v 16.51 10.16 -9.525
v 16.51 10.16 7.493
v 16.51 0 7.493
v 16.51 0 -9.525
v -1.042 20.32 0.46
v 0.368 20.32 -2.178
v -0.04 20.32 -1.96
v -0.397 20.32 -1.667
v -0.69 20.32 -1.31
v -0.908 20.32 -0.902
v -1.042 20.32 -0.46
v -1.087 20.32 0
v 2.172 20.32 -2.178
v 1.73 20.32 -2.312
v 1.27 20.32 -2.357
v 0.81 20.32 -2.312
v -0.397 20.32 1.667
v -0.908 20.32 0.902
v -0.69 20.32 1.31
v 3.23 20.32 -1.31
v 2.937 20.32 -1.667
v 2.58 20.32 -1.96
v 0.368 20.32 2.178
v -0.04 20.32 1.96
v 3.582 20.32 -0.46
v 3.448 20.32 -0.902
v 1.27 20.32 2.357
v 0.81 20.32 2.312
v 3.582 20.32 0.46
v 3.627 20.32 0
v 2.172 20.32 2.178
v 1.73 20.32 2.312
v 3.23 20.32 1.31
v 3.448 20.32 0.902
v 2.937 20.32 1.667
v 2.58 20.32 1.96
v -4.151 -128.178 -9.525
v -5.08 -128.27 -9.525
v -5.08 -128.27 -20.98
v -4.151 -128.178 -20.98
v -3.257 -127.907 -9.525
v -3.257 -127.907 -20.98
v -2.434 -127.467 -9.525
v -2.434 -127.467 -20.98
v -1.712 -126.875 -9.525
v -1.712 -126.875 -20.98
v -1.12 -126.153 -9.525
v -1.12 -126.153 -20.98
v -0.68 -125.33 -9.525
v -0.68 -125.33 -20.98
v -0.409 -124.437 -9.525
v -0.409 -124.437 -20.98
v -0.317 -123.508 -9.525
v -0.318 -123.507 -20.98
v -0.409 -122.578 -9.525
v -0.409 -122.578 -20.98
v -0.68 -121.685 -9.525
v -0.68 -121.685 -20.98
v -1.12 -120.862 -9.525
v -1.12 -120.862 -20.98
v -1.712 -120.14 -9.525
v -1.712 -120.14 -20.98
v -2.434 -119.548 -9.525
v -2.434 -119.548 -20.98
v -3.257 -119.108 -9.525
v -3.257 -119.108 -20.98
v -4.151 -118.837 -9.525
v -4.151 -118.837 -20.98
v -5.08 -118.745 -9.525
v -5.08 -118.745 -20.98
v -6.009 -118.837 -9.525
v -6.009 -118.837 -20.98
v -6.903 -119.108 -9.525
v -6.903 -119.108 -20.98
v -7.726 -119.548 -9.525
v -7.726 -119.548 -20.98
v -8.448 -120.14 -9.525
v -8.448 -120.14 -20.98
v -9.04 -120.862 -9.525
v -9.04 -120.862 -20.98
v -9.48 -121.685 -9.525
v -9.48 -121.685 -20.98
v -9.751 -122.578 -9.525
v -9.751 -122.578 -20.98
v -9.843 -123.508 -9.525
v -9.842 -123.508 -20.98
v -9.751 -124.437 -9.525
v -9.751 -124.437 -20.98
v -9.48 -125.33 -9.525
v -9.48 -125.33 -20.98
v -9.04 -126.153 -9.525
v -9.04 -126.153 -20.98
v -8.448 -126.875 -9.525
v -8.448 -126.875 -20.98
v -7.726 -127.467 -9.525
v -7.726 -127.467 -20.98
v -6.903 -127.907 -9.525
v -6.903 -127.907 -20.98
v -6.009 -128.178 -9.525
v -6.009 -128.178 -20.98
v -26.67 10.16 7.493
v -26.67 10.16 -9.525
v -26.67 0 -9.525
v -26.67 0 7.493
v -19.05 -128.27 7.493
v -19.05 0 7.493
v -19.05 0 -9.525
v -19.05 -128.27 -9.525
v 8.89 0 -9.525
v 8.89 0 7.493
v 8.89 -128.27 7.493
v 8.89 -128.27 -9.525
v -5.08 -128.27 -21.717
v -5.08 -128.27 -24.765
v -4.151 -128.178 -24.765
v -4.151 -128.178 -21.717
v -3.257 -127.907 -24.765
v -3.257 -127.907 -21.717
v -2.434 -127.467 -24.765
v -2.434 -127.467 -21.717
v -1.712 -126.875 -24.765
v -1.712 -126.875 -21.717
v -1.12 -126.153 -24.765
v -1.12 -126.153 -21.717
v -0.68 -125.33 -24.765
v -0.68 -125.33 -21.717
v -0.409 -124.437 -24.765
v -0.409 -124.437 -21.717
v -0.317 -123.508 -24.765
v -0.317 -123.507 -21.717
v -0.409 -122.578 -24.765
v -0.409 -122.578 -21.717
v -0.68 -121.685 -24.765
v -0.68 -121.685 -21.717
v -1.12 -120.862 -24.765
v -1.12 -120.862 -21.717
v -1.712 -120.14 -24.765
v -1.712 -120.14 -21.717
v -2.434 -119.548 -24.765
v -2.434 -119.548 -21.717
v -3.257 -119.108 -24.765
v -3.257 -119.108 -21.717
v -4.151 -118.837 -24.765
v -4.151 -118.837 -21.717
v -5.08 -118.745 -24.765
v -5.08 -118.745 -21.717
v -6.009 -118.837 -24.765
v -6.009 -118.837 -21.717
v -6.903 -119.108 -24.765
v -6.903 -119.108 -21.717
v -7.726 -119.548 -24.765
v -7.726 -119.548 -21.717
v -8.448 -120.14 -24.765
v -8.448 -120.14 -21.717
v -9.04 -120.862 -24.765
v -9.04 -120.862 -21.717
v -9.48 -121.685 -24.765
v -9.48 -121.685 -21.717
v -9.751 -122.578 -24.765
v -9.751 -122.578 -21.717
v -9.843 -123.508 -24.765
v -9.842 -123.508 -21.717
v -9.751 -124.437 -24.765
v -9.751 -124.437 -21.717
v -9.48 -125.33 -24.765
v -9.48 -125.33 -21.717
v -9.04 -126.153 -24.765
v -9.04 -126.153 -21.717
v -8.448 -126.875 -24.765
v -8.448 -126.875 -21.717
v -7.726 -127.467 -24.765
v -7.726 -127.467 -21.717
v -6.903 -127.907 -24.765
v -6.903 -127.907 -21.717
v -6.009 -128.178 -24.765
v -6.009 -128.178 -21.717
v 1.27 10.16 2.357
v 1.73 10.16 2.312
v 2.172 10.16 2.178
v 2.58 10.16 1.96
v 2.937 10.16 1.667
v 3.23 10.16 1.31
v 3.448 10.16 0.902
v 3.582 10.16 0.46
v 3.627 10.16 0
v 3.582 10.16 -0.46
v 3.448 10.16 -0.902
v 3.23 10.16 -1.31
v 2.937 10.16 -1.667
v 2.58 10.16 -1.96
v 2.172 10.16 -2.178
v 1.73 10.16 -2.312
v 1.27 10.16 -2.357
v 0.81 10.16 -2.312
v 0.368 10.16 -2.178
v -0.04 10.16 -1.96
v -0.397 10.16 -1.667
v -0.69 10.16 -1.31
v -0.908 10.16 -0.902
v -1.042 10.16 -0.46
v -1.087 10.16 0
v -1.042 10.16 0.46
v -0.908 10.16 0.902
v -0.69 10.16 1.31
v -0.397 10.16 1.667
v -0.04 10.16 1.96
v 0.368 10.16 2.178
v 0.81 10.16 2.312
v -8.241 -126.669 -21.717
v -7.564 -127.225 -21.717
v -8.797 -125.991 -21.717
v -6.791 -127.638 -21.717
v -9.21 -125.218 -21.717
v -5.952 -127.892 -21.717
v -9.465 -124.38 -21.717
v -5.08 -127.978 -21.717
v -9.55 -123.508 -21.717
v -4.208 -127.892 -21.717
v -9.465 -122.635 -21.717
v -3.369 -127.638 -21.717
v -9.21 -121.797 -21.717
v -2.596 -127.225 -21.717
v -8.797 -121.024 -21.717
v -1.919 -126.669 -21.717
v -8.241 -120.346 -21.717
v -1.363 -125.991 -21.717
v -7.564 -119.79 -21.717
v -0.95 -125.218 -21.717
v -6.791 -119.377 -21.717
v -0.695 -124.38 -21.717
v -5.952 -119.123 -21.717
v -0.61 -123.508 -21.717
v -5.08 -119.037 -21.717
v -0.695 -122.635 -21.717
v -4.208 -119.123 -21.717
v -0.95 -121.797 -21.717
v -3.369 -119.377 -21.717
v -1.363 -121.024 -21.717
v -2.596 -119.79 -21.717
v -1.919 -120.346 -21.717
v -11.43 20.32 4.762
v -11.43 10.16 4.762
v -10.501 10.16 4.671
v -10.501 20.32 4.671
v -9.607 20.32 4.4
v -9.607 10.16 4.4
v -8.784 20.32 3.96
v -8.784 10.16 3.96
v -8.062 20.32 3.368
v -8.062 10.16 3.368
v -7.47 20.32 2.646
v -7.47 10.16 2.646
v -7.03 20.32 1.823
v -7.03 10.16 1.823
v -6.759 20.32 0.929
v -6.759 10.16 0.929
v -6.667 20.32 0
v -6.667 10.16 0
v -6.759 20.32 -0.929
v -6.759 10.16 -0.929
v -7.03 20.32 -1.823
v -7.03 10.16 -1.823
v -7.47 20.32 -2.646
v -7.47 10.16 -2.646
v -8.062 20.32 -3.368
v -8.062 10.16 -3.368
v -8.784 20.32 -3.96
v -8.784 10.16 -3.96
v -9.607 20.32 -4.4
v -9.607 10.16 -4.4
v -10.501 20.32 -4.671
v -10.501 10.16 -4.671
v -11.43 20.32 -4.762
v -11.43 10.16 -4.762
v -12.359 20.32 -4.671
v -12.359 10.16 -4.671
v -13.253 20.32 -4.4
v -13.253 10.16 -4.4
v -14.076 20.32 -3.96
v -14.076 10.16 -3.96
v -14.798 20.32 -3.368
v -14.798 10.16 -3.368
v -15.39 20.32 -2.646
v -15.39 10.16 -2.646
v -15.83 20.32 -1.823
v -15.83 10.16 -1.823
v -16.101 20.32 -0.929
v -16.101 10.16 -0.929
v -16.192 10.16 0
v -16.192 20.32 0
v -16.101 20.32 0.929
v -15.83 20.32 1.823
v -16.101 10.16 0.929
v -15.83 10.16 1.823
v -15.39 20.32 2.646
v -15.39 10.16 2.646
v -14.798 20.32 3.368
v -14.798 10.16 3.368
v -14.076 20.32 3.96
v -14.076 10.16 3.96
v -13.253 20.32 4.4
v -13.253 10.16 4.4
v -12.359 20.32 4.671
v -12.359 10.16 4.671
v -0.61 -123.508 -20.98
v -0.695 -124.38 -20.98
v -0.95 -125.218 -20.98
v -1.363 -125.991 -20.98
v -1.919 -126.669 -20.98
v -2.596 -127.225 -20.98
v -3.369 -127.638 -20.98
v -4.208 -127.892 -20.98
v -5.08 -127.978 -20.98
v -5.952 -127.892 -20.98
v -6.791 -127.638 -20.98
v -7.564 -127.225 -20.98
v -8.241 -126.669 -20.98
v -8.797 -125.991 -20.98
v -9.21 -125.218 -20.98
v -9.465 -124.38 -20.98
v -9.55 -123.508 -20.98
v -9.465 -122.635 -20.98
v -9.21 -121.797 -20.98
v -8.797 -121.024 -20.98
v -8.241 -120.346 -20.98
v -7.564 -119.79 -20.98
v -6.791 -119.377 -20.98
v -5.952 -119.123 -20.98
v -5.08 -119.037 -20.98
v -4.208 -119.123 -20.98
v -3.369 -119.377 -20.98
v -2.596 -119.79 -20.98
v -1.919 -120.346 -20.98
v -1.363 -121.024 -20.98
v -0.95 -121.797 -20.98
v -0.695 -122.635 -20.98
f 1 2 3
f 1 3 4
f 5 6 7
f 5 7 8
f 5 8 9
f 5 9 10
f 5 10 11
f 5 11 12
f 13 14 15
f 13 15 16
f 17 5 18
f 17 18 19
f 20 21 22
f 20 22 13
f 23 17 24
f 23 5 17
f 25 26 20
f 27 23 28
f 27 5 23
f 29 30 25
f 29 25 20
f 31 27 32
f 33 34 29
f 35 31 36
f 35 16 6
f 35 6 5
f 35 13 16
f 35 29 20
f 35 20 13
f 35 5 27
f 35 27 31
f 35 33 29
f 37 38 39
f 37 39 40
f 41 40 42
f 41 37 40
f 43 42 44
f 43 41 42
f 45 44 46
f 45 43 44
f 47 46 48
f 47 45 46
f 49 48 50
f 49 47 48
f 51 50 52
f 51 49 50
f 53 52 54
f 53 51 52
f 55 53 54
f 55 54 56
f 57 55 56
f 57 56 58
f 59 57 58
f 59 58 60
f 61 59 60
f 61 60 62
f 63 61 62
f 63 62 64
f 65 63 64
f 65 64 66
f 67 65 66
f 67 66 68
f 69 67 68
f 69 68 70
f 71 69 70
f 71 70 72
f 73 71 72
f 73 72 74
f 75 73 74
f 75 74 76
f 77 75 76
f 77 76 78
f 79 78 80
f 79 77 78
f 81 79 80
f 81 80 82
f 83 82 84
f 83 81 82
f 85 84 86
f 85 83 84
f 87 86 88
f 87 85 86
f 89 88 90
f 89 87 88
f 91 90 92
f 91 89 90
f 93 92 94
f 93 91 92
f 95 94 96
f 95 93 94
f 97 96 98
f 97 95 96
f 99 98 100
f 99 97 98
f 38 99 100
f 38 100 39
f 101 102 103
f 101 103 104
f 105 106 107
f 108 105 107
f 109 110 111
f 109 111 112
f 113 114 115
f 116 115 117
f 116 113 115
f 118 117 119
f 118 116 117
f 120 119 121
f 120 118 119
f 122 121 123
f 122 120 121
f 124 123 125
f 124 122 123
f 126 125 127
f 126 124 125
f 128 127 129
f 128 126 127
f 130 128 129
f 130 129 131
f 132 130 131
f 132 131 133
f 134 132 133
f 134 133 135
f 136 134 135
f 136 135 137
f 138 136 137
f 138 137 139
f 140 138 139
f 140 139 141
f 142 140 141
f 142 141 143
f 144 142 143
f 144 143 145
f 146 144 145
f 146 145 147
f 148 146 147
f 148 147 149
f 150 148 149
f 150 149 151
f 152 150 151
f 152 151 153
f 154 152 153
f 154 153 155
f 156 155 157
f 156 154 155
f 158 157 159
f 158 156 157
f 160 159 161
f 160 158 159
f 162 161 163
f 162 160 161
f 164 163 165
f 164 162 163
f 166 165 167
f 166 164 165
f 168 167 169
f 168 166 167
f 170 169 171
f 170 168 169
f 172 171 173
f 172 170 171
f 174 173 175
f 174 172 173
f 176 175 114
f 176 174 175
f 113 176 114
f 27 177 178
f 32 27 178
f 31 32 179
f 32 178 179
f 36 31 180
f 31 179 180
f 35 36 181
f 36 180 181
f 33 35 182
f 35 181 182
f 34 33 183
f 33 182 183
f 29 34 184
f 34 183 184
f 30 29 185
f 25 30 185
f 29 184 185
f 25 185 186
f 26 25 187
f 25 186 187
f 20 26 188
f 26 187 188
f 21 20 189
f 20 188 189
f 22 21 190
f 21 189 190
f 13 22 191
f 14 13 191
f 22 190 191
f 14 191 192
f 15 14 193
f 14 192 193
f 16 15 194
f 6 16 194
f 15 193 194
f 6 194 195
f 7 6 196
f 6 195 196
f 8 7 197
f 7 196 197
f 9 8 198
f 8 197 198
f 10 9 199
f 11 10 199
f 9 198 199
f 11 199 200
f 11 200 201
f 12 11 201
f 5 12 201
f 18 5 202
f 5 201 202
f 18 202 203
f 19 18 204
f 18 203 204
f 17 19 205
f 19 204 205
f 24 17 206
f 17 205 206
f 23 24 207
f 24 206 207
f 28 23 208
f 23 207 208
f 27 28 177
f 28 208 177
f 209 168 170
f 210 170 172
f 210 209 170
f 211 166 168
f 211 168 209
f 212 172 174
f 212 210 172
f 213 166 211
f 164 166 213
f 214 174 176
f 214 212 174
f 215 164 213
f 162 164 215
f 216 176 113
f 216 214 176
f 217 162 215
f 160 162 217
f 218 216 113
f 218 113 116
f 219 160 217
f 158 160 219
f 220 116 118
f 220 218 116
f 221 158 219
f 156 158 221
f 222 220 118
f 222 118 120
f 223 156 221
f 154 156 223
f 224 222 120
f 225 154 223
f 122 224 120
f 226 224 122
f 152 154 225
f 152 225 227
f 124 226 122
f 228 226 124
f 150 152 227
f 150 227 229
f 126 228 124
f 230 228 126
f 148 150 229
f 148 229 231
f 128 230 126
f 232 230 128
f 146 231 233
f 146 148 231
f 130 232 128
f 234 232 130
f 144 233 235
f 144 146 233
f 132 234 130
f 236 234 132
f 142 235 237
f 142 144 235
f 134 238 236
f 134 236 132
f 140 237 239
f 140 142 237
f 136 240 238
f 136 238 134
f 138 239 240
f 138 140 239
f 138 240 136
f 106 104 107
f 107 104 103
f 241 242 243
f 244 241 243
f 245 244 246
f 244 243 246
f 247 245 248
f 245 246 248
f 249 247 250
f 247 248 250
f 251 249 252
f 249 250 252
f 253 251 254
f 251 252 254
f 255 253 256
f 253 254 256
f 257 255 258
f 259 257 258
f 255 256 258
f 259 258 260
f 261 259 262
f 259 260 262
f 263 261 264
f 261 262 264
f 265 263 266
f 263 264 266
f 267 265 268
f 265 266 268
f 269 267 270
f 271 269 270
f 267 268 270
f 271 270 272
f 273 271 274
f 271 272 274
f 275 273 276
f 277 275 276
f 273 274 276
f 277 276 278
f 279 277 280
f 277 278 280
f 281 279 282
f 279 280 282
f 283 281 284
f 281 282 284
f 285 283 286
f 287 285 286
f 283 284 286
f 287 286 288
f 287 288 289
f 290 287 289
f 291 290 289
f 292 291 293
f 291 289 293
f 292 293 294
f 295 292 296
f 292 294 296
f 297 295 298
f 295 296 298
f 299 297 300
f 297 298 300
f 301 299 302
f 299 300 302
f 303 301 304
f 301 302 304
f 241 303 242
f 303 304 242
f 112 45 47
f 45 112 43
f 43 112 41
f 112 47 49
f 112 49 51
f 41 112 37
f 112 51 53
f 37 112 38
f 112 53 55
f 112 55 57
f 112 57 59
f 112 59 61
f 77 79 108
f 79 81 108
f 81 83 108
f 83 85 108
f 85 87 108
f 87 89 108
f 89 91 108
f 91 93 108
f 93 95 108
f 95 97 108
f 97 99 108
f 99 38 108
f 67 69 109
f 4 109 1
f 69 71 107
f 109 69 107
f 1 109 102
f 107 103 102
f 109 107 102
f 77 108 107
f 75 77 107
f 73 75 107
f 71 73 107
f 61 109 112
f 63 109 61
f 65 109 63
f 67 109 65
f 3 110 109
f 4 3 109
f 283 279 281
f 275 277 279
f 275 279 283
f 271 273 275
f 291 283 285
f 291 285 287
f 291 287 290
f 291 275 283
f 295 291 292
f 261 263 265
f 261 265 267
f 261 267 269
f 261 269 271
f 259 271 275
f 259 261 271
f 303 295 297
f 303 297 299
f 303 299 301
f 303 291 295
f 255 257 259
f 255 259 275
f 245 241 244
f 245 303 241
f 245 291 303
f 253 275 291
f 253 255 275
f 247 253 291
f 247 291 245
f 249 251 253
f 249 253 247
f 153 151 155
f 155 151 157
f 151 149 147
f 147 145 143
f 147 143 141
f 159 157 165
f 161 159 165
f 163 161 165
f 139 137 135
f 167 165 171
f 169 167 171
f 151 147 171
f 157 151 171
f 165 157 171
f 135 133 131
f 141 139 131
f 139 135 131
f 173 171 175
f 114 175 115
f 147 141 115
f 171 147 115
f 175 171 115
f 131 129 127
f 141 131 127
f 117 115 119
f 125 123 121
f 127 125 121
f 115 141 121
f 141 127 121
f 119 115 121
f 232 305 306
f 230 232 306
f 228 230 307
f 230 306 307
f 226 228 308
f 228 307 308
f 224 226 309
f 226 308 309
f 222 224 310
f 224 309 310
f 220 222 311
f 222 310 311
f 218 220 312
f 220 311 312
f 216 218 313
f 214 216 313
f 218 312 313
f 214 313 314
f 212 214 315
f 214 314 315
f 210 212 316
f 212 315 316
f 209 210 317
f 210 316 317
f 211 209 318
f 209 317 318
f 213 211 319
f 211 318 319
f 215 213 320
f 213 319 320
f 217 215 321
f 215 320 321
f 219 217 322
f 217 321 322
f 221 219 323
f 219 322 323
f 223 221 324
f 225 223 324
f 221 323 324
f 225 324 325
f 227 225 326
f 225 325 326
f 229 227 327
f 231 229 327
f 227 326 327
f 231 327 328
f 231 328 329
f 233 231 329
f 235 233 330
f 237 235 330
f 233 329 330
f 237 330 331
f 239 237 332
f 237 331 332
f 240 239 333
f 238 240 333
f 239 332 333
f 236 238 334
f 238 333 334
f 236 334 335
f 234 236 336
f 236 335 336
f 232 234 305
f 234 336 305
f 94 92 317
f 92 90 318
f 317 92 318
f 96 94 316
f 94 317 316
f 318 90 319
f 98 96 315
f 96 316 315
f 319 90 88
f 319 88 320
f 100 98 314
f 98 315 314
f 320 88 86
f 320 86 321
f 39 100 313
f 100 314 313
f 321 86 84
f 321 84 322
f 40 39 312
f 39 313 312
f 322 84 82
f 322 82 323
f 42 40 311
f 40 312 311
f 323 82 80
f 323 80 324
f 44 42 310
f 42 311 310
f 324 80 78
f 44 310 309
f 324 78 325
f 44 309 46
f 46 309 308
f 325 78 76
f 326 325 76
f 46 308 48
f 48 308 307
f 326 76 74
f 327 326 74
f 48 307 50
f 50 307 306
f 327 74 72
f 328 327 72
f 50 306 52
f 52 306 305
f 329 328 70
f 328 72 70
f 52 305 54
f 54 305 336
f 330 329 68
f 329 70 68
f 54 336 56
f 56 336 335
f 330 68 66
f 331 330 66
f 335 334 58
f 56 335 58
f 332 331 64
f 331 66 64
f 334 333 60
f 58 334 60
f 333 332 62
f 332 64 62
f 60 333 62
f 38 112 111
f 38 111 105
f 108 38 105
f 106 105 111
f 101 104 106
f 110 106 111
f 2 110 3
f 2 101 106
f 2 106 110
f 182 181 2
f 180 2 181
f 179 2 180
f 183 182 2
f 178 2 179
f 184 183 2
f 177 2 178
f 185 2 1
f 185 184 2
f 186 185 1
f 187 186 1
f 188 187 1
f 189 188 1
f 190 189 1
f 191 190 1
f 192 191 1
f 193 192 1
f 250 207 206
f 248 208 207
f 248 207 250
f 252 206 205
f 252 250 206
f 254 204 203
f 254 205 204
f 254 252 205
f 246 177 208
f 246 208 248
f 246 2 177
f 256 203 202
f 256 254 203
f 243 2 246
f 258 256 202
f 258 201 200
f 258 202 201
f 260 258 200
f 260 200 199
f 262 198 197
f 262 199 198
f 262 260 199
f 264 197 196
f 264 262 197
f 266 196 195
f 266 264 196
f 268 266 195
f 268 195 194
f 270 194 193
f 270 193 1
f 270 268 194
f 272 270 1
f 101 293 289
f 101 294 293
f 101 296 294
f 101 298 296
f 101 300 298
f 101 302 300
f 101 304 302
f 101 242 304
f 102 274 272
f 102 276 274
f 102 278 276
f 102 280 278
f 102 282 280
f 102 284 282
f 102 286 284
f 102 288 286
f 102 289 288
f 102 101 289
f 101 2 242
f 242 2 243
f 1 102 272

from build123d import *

# Parameters (mm, degrees)
SKETCH1_W              = 33.02
SKETCH1_H              = 19.05
BOSS_EXTRUDE1_DEPTH    = 10.16
SKETCH2_R              = 4.7625
SKETCH2_R_2            = 2.357295936
BOSS_EXTRUDE2_DEPTH    = 10.16
SKETCH5_W              = 19.05
SKETCH5_H              = 10.16
BOSS_EXTRUDE3_DEPTH    = 5.08
SKETCH6_W              = 19.05
SKETCH6_H              = 10.16
BOSS_EXTRUDE4_DEPTH    = 5.08
SKETCH7_W              = 27.94
SKETCH7_H              = 19.05
BOSS_EXTRUDE5_DEPTH    = 128.27
SKETCH9_R              = 4.7625
BOSS_EXTRUDE6_DEPTH    = 15.24
CUT_EXTRUDE3_START     = -21.717
CUT_EXTRUDE3_OUTLINE_R = 4.7625
CUT_EXTRUDE3_DEPTH     = 0.7366
SKETCH13_R             = 4.4704
BOSS_EXTRUDE8_DEPTH    = 0.7366
SKETCH14_W             = 27.94
SKETCH14_H             = 10.16
CUT_EXTRUDE4_DEPTH     = 15.24
SKETCH15_W             = 43.18
SKETCH15_H             = 138.43
CUT_EXTRUDE5_DEPTH     = 2.032


# Read off the part's stored shape, not the designer's step: Cut-Extrude3
with BuildPart() as part:
    # Sketch1 → Boss-Extrude1 (new body)
    with BuildSketch(Plane(origin=(0, 0, 0), x_dir=(1, 0, 0), z_dir=(0, 1, 0))):
        with Locations((-5.08, 0)):
            Rectangle(SKETCH1_W, SKETCH1_H)
    extrude(amount=BOSS_EXTRUDE1_DEPTH)

    # Sketch2 → Boss-Extrude2 (add)
    with BuildSketch(Plane(origin=(0, 10.16, 0), x_dir=(1, 0, 0), z_dir=(0, 1, 0))):
        with Locations(Location((-11.43, 0, 0), (0, 0, 270))):
            Circle(SKETCH2_R)
        with Locations(Location((1.27, 0, 0), (0, 0, 270))):
            Circle(SKETCH2_R_2)
    extrude(amount=BOSS_EXTRUDE2_DEPTH)

    # Sketch5 → Boss-Extrude3 (add)
    with BuildSketch(Plane.ZY.offset(21.59)):
        with Locations((0, 5.08)):
            Rectangle(SKETCH5_W, SKETCH5_H)
    extrude(amount=BOSS_EXTRUDE3_DEPTH)

    # Sketch6 → Boss-Extrude4 (add)
    with BuildSketch(Plane(origin=(11.43, 0, 0), x_dir=(0, 0, -1), z_dir=(1, 0, 0))):
        with Locations((0, 5.08)):
            Rectangle(SKETCH6_W, SKETCH6_H)
    extrude(amount=BOSS_EXTRUDE4_DEPTH)

    # Sketch7 → Boss-Extrude5 (add)
    with BuildSketch(Plane(origin=(0, 0, 0), x_dir=(-1, 0, 0), z_dir=(0, -1, 0))):
        with Locations((5.08, 0)):
            Rectangle(SKETCH7_W, SKETCH7_H)
    extrude(amount=BOSS_EXTRUDE5_DEPTH)

    # Sketch9 → Boss-Extrude6 (add)
    with BuildSketch(Plane.XY.offset(9.525)):
        with Locations(Location((-5.08, -123.5075, 0), (0, 0, 270))):
            Circle(SKETCH9_R)
    boss_extrude6 = extrude(amount=BOSS_EXTRUDE6_DEPTH)

    # Mirror5: Boss-Extrude6 across plane
    add(boss_extrude6.mirror(Plane.XY))

    # Cut-Extrude3 outline → Cut-Extrude3 (cut)
    with BuildSketch(Plane.XY.offset(CUT_EXTRUDE3_START)):
        with Locations((-5.08, -123.5075)):
            Circle(CUT_EXTRUDE3_OUTLINE_R)
    extrude(amount=CUT_EXTRUDE3_DEPTH, mode=Mode.SUBTRACT)

    # Sketch13 → Boss-Extrude8 (add)
    with BuildSketch(Plane(origin=(0, 0, -20.9804), x_dir=(-1, 0, 0), z_dir=(0, 0, -1))):
        with Locations(Location((5.08, -123.5075, 0), (0, 0, 180))):
            Circle(SKETCH13_R)
    extrude(amount=BOSS_EXTRUDE8_DEPTH)

    # Sketch14 → Cut-Extrude4 (cut)
    with BuildSketch(Plane.XY.offset(9.525)):
        with Locations((-5.08, -123.19)):
            Rectangle(SKETCH14_W, SKETCH14_H)
    extrude(amount=CUT_EXTRUDE4_DEPTH, mode=Mode.SUBTRACT)

    # Sketch15 → Cut-Extrude5 (cut)
    with BuildSketch(Plane.XY.offset(9.525)):
        with Locations((-5.08, -59.055)):
            Rectangle(SKETCH15_W, SKETCH15_H)
    extrude(amount=-CUT_EXTRUDE5_DEPTH, mode=Mode.SUBTRACT)


solid = part.part
